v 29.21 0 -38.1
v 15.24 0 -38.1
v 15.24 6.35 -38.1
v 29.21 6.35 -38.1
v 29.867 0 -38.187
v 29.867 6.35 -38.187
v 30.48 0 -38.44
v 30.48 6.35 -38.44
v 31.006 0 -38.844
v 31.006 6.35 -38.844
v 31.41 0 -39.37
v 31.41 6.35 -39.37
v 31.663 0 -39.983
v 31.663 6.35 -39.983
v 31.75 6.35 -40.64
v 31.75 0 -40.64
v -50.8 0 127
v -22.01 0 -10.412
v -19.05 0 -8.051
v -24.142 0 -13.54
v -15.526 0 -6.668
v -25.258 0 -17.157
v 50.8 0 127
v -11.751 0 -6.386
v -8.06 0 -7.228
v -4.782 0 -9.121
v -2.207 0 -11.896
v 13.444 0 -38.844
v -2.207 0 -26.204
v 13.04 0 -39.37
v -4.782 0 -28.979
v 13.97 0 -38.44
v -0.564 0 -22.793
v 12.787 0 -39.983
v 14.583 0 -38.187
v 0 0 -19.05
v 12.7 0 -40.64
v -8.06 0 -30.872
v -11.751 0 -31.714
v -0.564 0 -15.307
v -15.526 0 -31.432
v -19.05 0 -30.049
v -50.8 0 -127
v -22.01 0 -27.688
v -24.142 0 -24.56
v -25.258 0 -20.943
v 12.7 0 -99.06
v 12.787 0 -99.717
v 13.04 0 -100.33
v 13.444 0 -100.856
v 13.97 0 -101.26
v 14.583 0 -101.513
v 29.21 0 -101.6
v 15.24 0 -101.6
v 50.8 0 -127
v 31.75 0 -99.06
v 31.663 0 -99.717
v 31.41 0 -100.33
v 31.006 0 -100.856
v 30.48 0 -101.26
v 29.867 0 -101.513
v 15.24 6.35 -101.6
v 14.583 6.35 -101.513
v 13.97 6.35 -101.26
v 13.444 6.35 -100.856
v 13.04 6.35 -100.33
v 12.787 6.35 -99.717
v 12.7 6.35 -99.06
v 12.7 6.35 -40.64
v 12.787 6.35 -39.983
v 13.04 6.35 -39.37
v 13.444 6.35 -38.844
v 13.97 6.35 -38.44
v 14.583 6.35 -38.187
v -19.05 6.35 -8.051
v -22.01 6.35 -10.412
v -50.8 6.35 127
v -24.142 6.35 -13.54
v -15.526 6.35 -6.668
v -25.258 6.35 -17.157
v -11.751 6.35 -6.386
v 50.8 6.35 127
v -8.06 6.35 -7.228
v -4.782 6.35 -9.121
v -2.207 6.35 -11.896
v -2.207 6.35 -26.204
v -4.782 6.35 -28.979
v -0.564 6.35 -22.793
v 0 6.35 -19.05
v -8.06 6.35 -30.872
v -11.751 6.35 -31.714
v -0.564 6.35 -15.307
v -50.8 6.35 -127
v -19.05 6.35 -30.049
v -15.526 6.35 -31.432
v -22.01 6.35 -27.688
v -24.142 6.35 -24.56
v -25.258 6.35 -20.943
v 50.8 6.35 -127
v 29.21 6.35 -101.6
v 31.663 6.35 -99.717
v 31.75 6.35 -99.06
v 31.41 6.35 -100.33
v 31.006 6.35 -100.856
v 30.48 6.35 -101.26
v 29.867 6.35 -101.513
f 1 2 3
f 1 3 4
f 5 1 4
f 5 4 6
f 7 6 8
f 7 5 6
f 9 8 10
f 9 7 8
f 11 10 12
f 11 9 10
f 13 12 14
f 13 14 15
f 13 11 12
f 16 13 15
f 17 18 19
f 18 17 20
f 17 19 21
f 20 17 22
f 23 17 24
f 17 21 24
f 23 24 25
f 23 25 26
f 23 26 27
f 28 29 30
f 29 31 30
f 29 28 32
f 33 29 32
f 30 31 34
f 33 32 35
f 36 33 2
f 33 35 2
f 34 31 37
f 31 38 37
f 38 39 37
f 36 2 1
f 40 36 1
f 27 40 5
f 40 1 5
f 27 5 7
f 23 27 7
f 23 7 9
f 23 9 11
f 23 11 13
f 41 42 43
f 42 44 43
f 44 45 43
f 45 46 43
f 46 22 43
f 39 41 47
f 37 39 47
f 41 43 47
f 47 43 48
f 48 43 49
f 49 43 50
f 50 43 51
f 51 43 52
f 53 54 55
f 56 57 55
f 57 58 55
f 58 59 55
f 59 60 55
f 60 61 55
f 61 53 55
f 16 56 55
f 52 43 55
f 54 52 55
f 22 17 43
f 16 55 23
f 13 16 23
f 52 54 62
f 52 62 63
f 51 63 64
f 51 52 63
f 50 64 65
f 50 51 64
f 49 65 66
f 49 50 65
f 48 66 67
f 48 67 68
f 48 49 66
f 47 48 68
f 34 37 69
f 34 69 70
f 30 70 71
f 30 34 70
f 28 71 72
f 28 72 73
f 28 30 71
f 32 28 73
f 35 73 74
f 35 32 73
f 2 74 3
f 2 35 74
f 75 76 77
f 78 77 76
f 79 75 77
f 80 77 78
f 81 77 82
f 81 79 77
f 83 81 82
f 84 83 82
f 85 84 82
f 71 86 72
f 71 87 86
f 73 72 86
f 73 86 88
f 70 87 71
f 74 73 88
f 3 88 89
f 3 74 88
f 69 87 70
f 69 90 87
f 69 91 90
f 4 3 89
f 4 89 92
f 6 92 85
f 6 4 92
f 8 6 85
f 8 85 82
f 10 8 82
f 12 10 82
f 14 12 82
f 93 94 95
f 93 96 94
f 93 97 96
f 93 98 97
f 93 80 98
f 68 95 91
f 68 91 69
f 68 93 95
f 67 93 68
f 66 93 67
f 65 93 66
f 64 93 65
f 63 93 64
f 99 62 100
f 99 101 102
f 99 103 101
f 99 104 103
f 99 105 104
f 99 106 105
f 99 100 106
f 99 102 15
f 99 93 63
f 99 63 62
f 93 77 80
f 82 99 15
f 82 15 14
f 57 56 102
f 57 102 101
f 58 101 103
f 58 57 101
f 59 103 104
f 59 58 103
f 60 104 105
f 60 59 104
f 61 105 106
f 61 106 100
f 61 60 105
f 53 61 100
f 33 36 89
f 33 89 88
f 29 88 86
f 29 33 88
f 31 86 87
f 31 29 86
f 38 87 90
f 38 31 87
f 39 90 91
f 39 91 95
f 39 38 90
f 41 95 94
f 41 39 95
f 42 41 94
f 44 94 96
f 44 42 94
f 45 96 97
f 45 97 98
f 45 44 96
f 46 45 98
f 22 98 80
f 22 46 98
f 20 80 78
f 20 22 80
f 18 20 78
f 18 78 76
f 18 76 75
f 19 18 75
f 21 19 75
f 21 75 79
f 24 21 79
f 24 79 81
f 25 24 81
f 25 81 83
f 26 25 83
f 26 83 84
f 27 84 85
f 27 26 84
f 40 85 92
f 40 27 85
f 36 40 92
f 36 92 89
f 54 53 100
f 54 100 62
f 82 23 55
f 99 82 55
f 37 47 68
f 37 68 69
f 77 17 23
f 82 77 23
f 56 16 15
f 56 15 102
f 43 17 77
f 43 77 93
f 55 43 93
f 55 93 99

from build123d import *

# Parameters (mm, degrees)
SKETCH1_W           = 101.6
SKETCH1_H           = 254
SKETCH1_R           = 12.7
BOSS_EXTRUDE1_DEPTH = 6.35


with BuildPart() as part:
    # Sketch1 → Boss-Extrude1 (new body)
    with BuildSketch(Plane(origin=(0, 0, 0), x_dir=(1, 0, 0), z_dir=(0, 1, 0))):
        Rectangle(SKETCH1_W, SKETCH1_H)
        with Locations((-12.7, 19.05)):
            Circle(SKETCH1_R, mode=Mode.SUBTRACT)
        with BuildLine():
            Line((29.21, 101.6), (15.24, 101.6))
            ThreePointArc((15.24, 101.6), (13.443948776, 100.856051224), (12.7, 99.06))
            Line((12.7, 99.06), (12.7, 40.64))
            ThreePointArc((12.7, 40.64), (13.443948776, 38.843948776), (15.24, 38.1))
            Line((15.24, 38.1), (29.21, 38.1))
            ThreePointArc((29.21, 38.1), (31.006051224, 38.843948776), (31.75, 40.64))
            Line((31.75, 40.64), (31.75, 99.06))
            ThreePointArc((31.75, 99.06), (31.006051224, 100.856051224), (29.21, 101.6))
        make_face(mode=Mode.SUBTRACT)
    extrude(amount=BOSS_EXTRUDE1_DEPTH)


solid = part.part
